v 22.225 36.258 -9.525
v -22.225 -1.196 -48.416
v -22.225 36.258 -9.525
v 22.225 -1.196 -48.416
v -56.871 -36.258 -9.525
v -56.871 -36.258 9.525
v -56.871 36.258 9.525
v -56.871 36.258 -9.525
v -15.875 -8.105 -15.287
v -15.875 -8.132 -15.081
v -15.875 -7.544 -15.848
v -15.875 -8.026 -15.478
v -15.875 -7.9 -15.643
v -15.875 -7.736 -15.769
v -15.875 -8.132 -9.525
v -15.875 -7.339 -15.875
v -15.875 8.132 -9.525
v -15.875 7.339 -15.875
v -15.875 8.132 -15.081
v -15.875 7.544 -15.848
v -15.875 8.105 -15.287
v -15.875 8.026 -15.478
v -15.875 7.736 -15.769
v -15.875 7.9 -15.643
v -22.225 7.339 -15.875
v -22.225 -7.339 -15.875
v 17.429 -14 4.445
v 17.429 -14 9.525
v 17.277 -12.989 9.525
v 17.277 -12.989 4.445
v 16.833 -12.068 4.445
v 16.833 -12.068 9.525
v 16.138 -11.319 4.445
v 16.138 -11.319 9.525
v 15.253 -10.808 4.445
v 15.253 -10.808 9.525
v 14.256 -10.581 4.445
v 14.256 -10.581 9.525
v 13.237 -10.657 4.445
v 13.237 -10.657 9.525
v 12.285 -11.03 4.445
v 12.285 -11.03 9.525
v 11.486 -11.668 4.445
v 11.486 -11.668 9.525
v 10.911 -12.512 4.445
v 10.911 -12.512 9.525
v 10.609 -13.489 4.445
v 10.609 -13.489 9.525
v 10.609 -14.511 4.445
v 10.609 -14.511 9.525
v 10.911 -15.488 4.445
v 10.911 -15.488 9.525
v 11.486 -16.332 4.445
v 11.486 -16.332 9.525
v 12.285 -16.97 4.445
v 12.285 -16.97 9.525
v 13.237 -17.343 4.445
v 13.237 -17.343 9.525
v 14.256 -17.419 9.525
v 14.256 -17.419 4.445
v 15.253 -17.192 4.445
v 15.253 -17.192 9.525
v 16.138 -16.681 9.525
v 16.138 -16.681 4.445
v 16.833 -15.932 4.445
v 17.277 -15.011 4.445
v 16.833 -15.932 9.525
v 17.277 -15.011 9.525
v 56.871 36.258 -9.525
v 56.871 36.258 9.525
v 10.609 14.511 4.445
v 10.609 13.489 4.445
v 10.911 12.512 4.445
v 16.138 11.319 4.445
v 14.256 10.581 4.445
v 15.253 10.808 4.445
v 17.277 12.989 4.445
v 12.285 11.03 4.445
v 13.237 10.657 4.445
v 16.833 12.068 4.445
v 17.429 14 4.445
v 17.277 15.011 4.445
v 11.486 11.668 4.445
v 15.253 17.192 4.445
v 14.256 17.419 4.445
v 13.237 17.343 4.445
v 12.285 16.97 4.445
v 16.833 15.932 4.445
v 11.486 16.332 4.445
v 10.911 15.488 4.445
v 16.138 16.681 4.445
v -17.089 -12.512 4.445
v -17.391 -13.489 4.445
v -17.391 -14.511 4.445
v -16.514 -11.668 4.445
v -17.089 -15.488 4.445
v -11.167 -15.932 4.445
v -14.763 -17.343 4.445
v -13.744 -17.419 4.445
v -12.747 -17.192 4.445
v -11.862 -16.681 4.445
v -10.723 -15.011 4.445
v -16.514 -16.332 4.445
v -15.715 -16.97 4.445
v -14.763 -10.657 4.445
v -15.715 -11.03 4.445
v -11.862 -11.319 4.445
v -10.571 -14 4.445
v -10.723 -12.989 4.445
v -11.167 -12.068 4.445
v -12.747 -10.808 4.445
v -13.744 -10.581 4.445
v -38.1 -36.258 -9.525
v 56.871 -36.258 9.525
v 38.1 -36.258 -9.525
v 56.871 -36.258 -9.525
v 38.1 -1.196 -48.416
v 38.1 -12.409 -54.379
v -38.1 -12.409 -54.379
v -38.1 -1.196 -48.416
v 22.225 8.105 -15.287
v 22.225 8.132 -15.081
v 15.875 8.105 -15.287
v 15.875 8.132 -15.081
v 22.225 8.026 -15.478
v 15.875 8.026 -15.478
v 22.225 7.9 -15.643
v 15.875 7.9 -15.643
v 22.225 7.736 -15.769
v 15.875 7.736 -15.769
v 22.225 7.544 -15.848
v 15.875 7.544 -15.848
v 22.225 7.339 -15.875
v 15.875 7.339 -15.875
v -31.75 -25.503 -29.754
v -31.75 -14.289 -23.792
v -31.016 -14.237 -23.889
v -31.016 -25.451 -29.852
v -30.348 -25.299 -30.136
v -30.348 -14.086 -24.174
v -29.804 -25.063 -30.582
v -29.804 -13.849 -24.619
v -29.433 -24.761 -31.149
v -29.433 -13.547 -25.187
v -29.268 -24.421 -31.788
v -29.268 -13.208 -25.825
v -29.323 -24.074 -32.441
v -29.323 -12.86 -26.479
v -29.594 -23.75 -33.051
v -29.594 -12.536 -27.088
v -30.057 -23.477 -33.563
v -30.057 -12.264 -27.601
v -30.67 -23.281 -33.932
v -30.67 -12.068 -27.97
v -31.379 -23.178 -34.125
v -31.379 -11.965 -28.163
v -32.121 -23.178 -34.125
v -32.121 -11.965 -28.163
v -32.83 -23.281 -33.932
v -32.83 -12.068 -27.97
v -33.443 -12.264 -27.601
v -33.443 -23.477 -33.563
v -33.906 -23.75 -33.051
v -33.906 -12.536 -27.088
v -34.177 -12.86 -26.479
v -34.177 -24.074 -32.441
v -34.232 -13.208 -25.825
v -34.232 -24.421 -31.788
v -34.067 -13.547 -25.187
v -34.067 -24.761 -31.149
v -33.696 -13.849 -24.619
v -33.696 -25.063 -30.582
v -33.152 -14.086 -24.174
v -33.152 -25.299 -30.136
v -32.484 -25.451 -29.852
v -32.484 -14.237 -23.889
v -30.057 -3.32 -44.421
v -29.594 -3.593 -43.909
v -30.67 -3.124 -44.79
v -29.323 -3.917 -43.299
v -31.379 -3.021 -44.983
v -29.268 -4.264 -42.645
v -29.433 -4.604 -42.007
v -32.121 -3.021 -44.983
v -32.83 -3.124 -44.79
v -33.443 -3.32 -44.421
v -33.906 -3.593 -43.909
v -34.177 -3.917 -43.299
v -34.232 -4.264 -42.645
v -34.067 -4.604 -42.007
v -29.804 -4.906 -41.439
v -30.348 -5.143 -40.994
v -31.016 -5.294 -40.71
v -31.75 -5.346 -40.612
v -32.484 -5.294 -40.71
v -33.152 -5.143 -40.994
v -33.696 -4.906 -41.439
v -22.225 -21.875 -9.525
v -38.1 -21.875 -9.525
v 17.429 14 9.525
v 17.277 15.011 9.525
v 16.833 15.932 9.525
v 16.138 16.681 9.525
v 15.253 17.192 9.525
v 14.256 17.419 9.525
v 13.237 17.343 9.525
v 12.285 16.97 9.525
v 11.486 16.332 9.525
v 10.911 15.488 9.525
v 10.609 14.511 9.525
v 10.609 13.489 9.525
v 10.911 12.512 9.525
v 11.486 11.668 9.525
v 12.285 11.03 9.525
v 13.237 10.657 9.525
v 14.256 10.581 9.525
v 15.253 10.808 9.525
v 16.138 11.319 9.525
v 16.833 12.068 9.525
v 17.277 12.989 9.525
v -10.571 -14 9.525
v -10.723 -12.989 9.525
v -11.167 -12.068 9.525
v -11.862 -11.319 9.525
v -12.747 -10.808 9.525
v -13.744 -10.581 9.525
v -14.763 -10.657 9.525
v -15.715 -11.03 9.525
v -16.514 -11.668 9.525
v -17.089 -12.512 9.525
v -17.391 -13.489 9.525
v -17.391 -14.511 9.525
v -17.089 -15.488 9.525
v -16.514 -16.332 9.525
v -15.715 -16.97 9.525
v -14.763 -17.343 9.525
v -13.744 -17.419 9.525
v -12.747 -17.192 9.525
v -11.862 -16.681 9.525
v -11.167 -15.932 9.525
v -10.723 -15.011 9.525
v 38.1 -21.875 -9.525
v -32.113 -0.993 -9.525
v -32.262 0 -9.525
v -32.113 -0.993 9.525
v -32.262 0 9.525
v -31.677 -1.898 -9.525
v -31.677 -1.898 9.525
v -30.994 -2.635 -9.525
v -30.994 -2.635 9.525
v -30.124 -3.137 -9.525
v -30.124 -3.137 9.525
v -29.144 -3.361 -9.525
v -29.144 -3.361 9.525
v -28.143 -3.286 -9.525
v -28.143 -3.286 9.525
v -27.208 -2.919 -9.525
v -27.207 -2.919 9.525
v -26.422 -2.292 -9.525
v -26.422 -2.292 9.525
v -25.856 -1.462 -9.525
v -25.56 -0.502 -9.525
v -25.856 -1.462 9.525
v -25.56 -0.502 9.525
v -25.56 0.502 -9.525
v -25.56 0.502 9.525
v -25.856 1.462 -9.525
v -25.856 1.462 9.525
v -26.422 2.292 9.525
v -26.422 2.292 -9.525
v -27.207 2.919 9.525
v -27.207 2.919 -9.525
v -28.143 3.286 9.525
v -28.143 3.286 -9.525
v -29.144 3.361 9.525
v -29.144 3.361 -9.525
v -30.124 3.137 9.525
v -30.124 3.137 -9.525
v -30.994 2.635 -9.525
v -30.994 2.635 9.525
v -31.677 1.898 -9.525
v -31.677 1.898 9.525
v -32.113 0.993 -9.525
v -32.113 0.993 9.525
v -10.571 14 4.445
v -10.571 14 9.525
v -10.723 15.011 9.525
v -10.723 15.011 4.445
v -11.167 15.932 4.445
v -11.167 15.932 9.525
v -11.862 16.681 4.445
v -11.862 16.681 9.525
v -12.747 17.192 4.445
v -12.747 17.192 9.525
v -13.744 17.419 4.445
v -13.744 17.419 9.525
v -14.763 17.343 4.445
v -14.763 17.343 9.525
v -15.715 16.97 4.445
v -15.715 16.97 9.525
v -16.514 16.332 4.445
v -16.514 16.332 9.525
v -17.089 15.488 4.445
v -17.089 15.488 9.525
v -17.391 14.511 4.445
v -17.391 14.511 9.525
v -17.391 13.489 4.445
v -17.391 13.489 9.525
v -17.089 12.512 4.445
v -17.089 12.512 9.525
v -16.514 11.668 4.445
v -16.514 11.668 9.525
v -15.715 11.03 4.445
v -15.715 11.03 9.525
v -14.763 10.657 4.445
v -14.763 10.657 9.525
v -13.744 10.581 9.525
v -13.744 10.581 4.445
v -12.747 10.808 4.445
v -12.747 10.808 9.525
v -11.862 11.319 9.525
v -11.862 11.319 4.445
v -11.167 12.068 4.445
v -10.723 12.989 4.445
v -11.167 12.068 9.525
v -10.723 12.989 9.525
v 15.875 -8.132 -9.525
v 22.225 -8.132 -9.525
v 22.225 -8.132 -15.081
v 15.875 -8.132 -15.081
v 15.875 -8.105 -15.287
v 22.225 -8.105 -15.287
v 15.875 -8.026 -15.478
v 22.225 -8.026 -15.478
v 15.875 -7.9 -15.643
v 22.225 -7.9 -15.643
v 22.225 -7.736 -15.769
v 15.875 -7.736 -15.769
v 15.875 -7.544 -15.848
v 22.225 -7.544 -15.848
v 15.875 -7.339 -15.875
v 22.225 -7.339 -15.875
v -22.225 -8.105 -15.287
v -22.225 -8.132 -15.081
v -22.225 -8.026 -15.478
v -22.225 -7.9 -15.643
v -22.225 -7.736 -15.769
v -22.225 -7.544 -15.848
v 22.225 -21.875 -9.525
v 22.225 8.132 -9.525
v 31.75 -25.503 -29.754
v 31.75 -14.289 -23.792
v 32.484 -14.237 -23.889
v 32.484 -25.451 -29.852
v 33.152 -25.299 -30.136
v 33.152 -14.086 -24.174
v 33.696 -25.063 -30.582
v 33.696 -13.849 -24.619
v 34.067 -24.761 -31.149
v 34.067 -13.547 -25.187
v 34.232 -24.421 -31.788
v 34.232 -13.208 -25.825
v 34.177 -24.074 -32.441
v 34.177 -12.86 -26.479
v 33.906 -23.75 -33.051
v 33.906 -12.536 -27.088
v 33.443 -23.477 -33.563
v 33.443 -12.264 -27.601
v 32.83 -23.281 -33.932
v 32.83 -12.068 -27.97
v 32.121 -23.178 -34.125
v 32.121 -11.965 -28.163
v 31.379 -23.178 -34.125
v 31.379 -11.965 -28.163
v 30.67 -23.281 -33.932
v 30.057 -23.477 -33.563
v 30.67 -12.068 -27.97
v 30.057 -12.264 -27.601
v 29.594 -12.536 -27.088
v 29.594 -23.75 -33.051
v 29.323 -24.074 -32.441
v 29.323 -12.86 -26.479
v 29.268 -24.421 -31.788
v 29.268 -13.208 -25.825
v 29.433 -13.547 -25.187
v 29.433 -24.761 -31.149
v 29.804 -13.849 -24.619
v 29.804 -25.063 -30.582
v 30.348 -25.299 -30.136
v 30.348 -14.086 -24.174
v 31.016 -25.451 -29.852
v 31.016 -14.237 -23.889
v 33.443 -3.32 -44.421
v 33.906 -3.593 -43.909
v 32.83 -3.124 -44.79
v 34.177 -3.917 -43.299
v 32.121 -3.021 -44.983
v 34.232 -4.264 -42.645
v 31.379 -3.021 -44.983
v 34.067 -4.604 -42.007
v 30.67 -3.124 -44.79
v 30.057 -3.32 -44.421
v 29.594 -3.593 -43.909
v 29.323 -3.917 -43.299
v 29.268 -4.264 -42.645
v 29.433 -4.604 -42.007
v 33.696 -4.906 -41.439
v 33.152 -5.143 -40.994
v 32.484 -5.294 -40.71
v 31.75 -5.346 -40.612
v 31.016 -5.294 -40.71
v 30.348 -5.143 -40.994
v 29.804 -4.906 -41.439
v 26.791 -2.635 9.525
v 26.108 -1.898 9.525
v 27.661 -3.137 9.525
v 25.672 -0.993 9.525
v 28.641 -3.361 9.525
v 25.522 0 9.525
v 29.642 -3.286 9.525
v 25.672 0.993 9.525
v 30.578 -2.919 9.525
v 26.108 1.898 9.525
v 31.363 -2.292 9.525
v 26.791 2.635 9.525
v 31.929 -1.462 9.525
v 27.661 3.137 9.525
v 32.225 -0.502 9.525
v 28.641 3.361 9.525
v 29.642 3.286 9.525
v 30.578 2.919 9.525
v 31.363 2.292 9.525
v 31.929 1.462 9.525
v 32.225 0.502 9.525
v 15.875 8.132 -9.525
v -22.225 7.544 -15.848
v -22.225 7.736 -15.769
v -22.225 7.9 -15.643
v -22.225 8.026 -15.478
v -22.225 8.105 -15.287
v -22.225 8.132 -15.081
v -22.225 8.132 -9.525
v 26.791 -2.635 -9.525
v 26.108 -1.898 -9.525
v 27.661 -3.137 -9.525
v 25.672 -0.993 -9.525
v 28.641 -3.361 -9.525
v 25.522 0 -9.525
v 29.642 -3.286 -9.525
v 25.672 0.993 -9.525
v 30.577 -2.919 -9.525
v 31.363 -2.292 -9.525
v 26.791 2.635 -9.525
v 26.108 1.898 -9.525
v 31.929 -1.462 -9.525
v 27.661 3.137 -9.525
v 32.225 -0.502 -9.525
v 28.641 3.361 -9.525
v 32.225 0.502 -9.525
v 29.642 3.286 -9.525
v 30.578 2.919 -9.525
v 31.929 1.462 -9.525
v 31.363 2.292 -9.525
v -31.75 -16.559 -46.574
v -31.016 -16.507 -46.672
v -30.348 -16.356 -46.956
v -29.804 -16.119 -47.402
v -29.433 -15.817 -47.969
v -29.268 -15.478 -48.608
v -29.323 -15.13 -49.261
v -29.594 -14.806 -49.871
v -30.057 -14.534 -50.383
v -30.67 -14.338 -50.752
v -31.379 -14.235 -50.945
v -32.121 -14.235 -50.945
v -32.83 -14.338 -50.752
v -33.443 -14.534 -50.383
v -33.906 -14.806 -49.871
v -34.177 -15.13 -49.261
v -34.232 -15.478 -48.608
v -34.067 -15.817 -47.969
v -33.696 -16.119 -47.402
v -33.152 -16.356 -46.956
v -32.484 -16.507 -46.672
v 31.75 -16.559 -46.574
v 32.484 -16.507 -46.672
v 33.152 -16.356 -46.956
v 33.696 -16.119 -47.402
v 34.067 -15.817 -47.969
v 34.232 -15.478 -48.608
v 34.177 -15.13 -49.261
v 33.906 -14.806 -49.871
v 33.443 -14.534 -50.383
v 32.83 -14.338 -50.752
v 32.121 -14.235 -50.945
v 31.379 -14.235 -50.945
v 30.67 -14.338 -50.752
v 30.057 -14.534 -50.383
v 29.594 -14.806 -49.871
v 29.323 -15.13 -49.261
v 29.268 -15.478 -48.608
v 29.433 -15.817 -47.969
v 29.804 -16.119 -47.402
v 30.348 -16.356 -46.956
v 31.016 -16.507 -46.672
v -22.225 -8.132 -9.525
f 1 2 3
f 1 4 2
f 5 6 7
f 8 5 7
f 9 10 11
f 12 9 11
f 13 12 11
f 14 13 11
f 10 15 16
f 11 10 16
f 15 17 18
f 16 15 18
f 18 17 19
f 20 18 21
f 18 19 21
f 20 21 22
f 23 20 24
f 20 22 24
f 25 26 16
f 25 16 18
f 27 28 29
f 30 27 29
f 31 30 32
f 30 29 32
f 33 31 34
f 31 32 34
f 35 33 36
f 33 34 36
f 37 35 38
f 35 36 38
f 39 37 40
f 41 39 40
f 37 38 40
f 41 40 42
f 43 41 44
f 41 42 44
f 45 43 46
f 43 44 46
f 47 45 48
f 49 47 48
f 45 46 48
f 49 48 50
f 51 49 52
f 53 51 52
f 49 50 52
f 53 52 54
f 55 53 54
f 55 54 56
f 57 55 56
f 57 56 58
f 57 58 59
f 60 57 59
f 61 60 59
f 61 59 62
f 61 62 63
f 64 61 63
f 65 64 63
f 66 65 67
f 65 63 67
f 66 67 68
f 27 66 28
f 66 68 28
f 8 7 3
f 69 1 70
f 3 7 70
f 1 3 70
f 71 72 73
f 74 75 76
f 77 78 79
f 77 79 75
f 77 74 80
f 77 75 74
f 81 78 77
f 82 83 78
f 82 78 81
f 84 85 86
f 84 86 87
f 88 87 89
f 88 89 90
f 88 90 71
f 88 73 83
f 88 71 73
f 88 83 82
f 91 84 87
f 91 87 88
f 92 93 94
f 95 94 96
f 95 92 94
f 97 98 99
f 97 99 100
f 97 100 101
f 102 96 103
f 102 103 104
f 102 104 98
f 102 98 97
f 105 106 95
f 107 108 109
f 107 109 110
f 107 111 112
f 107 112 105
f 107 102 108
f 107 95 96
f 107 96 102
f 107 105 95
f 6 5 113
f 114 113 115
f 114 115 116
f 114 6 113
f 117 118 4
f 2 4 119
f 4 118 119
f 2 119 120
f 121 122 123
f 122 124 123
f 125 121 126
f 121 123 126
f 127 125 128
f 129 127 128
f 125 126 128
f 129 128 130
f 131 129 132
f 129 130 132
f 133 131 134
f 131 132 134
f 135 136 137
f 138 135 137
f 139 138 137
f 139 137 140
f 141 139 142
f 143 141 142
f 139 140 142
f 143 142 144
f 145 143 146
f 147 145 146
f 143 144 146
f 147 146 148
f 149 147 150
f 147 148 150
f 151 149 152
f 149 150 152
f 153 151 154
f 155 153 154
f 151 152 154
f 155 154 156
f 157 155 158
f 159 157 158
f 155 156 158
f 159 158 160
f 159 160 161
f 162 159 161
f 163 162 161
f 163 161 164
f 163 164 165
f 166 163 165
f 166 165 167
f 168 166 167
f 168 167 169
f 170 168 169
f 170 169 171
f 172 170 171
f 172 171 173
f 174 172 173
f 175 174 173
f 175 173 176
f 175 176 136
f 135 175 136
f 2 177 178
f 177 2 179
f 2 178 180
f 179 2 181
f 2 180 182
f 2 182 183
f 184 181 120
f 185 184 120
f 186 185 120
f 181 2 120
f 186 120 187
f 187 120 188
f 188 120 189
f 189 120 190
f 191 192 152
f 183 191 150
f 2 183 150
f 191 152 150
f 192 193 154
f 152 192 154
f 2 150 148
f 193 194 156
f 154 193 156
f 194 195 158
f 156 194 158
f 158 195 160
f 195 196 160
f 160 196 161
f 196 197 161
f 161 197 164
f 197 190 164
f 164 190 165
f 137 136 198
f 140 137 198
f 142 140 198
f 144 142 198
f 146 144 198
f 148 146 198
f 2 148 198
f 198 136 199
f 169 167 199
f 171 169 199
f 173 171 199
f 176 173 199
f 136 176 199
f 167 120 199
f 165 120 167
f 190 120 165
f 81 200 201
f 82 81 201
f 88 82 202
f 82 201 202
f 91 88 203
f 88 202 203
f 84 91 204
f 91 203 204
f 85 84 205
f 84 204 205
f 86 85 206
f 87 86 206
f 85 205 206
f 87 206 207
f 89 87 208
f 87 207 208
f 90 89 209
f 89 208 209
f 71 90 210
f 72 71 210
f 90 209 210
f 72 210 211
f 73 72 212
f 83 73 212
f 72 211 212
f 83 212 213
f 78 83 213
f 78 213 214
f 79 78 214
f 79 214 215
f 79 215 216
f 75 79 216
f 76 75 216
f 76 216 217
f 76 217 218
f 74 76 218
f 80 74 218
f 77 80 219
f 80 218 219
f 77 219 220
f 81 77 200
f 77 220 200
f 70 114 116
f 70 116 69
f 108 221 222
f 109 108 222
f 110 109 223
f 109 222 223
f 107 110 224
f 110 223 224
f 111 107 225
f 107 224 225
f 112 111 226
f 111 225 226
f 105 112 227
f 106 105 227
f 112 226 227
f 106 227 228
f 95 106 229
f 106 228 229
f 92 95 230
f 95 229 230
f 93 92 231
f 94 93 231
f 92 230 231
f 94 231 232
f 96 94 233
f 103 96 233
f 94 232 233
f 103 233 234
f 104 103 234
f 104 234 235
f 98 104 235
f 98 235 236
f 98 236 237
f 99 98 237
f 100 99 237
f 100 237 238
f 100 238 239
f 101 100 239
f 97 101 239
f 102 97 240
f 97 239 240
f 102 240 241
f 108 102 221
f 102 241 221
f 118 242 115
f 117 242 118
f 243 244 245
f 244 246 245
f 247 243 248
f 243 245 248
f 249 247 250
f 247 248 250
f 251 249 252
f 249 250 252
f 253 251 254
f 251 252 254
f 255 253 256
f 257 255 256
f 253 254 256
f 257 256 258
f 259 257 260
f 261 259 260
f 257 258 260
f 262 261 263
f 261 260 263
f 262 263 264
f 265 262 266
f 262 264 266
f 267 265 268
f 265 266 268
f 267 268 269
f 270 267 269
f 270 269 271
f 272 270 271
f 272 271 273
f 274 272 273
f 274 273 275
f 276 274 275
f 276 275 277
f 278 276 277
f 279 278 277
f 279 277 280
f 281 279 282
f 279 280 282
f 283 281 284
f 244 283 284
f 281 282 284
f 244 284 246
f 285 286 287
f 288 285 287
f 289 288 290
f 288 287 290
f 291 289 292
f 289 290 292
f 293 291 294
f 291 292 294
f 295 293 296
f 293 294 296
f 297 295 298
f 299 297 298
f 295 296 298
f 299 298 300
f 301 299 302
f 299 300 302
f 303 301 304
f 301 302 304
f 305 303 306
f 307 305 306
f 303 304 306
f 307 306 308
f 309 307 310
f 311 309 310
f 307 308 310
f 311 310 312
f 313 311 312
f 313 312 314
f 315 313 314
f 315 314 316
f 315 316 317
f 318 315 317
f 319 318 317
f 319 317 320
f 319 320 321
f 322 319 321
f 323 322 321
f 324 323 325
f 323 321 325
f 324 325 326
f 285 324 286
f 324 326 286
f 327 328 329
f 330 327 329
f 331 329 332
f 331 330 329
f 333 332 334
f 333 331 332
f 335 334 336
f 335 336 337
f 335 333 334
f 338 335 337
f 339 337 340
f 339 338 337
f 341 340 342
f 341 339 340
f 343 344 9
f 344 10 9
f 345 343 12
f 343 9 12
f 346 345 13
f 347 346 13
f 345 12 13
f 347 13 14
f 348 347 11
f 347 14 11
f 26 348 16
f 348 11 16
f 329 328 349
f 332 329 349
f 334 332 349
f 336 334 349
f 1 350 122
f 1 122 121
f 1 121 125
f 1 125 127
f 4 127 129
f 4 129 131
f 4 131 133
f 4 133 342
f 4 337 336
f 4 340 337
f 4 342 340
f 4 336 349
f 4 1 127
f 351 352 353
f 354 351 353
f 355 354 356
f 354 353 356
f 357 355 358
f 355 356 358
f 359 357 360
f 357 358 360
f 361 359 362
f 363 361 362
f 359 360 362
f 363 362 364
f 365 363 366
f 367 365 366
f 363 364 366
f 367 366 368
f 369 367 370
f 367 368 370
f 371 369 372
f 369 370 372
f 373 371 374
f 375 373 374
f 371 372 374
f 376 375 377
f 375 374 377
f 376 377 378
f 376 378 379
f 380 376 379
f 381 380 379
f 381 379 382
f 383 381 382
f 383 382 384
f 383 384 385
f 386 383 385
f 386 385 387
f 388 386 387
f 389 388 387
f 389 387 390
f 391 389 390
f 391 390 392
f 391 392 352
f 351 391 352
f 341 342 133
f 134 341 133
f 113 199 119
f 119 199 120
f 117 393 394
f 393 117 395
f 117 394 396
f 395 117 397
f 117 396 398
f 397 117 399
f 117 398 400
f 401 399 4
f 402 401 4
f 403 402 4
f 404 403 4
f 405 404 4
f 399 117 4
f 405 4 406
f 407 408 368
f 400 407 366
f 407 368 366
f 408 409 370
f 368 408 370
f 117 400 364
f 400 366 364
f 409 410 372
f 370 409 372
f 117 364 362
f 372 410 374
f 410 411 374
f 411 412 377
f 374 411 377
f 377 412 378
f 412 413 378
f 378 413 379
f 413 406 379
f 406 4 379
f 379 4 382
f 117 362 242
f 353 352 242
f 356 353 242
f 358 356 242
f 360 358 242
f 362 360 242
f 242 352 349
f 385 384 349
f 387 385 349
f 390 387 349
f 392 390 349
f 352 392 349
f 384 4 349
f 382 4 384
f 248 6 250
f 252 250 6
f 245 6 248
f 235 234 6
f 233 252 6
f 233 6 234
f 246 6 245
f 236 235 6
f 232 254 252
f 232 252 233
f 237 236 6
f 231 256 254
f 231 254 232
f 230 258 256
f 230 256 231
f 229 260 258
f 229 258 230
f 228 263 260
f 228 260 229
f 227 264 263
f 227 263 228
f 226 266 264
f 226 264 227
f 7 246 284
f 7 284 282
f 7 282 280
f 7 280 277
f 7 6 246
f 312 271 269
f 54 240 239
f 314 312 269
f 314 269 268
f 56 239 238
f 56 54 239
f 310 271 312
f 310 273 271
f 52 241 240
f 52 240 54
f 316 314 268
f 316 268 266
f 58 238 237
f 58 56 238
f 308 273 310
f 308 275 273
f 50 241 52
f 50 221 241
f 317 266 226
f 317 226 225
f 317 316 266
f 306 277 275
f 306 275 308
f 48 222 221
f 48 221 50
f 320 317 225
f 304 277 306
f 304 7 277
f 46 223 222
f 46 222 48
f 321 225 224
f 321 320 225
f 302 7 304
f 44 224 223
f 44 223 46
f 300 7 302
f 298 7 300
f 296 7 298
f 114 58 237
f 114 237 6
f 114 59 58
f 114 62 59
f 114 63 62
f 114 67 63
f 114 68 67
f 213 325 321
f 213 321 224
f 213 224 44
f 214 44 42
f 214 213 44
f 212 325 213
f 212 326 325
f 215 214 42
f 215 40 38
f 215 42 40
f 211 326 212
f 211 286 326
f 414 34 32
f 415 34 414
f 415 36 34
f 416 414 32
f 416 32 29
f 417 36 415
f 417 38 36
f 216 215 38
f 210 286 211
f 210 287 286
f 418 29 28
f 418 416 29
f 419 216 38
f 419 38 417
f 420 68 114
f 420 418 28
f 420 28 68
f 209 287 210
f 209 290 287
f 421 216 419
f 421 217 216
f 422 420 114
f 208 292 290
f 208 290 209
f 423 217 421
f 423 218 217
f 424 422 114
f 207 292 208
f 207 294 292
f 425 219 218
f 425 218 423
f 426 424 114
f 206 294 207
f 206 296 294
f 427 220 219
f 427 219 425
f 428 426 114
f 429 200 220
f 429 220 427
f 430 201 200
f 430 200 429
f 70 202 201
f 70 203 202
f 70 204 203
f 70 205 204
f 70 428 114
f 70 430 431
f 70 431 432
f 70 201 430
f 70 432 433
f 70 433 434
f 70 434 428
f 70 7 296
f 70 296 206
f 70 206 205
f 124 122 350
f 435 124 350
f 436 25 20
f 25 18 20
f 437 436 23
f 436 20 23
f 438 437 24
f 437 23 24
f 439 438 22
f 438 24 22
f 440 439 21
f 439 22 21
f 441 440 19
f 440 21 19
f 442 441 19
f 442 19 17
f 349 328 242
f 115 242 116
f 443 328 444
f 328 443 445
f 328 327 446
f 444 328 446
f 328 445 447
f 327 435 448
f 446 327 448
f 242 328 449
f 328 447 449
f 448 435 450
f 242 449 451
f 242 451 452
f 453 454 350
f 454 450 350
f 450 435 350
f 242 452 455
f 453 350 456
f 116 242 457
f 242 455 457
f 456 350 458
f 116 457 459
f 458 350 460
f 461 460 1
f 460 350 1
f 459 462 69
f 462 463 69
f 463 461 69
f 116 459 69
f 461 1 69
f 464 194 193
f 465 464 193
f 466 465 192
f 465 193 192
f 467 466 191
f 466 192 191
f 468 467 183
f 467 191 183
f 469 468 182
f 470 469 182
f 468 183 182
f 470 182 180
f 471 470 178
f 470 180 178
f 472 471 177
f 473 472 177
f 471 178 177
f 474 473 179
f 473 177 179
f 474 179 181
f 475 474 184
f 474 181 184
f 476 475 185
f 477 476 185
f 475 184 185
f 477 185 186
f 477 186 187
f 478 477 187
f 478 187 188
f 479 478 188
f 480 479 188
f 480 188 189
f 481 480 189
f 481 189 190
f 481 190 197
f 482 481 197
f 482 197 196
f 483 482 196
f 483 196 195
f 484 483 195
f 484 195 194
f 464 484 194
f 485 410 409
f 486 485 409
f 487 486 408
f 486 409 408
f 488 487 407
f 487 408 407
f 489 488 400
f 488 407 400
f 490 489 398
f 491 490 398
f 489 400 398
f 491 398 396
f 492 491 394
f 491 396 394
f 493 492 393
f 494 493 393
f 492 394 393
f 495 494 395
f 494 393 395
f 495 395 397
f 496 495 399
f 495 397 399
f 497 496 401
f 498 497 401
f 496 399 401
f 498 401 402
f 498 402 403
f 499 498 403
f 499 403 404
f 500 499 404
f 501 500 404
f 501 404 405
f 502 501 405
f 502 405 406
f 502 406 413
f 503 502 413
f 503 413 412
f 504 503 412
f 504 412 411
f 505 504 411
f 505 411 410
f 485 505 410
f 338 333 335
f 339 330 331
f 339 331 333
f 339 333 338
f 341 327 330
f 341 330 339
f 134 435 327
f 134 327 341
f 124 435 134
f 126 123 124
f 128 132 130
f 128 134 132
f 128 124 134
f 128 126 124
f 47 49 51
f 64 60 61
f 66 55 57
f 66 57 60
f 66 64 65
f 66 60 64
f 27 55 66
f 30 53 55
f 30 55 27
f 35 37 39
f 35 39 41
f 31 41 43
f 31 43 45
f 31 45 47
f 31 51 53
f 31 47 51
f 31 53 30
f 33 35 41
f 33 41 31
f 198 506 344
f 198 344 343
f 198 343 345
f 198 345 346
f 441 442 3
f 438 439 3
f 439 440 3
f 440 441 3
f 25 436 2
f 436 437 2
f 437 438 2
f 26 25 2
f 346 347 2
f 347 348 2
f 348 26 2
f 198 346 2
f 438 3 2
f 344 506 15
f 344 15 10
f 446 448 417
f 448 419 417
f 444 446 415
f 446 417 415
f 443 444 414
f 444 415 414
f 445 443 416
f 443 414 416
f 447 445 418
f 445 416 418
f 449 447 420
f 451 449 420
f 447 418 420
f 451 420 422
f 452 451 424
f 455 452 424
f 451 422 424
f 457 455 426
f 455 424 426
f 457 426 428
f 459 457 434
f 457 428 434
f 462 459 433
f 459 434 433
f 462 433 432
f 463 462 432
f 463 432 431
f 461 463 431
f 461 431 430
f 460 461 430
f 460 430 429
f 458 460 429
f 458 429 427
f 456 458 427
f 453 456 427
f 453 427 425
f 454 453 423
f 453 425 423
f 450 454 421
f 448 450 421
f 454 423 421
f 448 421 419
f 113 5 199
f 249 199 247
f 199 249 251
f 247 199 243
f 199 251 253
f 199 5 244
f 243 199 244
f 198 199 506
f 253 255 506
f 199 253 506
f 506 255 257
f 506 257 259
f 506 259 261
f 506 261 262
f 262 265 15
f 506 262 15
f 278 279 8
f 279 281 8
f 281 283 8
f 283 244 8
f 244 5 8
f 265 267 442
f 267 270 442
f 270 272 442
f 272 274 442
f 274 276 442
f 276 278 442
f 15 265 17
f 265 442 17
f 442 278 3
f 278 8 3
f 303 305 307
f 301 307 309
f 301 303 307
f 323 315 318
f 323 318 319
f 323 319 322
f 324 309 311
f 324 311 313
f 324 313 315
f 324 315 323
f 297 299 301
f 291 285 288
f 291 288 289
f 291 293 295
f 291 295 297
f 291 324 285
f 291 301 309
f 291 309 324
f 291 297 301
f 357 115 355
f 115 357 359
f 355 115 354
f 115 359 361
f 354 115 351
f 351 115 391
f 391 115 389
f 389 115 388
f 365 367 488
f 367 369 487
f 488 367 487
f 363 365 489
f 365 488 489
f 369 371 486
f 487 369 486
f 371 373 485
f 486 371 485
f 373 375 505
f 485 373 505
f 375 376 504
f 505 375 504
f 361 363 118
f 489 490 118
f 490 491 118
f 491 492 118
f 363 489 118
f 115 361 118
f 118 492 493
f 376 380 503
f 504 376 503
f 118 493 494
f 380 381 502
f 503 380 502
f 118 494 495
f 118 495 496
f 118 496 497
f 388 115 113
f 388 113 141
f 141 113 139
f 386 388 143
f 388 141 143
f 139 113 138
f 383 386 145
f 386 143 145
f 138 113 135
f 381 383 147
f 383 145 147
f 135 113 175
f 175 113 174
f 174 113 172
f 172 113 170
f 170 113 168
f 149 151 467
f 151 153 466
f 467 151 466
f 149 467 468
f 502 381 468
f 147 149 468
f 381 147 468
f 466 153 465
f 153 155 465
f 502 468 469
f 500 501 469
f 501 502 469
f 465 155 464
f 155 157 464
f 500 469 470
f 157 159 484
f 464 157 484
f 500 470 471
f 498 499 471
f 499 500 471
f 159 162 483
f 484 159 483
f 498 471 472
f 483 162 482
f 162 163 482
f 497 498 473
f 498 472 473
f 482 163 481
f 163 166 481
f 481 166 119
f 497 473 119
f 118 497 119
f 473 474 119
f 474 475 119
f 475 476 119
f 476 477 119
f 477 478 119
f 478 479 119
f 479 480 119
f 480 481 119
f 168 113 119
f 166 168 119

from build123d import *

# Parameters (mm, degrees)
SKETCH1_W                      = 113.7412
SKETCH1_H                      = 72.517
BOSS_EXTRUDE1_DEPTH            = 9.525
BOSS_EXTRUDE5_START            = -38.1
BOSS_EXTRUDE5_DEPTH            = 76.2
CUT_EXTRUDE3_REACH             = 88.637
SKETCH1_6_R                    = 3.37
CUT_EXTRUDE3_DIRECTION_2_DEPTH = 87.637123003
BOSS_EXTRUDE6_DEPTH            = 22.225
SKETCH7_R                      = 2.4892
CUT_EXTRUDE4_DEPTH             = 92.543856508
SKETCH8_R                      = 3.429
CUT_EXTRUDE5_DEPTH             = 5.08
CUT_EXTRUDE7_DEPTH             = 6.35
FILLET2_R                      = 0.79375


# Read off the part's stored shape, not the designer's step: Boss-Extrude5
with BuildPart() as part:
    # Sketch1 → Boss-Extrude1 (new, symmetric)
    with BuildSketch(Plane.XY):
        Rectangle(SKETCH1_W, SKETCH1_H)
    extrude(amount=BOSS_EXTRUDE1_DEPTH, both=True)

    # Boss-Extrude5 outline → Boss-Extrude5 (add)
    with BuildSketch(Plane(origin=(0, 0, 0), x_dir=(0, 0, -1), z_dir=(1, 0, 0)).offset(BOSS_EXTRUDE5_START)):
        Polygon((54.378737717, -12.40934461), (48.41644887, -1.195910181), (9.525, -21.874860356), (9.525, -36.2585), align=None)
    extrude(amount=BOSS_EXTRUDE5_DEPTH)

    # Sketch1<6> → Cut-Extrude3 (cut, up to next)
    with BuildSketch(Plane.XY, mode=Mode.PRIVATE) as cut_extrude3_sk1:
        with Locations(Location((-28.8925, 0, 0), (0, 0, 180))):
            Circle(SKETCH1_6_R)
    cut_extrude3_tool1 = extrude(cut_extrude3_sk1.sketch, amount=-CUT_EXTRUDE3_REACH, mode=Mode.PRIVATE) & part.part
    # Sketch1<6> → Cut-Extrude3 (cut, up to next)
    with BuildSketch(Plane.XY, mode=Mode.PRIVATE) as cut_extrude3_sk2:
        with Locations(Location((28.8925, 0, 0), (0, 0, 180))):
            Circle(SKETCH1_6_R)
    cut_extrude3_tool2 = extrude(cut_extrude3_sk2.sketch, amount=-CUT_EXTRUDE3_REACH, mode=Mode.PRIVATE) & part.part
    add(cut_extrude3_tool1.solids().sort_by_distance((-28.8925, 0, 0))[0], mode=Mode.SUBTRACT)
    add(cut_extrude3_tool2.solids().sort_by_distance((28.8925, 0, 0))[0], mode=Mode.SUBTRACT)

    # Sketch1<6> → Cut-Extrude3 direction 2 (cut)
    with BuildSketch(Plane.XY):
        with Locations(Location((-28.8925, 0, 0), (0, 0, 180))):
            Circle(SKETCH1_6_R)
        with Locations(Location((28.8925, 0, 0), (0, 0, 180))):
            Circle(SKETCH1_6_R)
    extrude(amount=CUT_EXTRUDE3_DIRECTION_2_DEPTH, mode=Mode.SUBTRACT)

    # Sketch6 → Boss-Extrude6 (add, symmetric)
    with BuildSketch(Plane(origin=(0, 0, 0), x_dir=(0, 0, -1), z_dir=(1, 0, 0))):
        Polygon((9.525, 36.2585), (9.525, -21.874860356), (48.41644887, -1.195910181), align=None)
    extrude(amount=BOSS_EXTRUDE6_DEPTH, both=True)

    # Sketch7 → Cut-Extrude4 (cut, through all)
    with BuildSketch(Plane(origin=(0, -21.001854955, -11.166884362), x_dir=(1, 0, 0), z_dir=(0, 0.882947592858928, 0.46947156278588875))):
        with Locations(Location((31.75, 35.837741163, 0), (0, 0, 270))):
            Circle(SKETCH7_R)
        with Locations(Location((31.75, 16.787741163, 0), (0, 0, 270))):
            Circle(SKETCH7_R)
        with Locations(Location((-31.75, 35.837741163, 0), (0, 0, 270))):
            Circle(SKETCH7_R)
        with Locations(Location((-31.75, 16.787741163, 0), (0, 0, 270))):
            Circle(SKETCH7_R)
    extrude(amount=-CUT_EXTRUDE4_DEPTH, mode=Mode.SUBTRACT)

    # Sketch8 → Cut-Extrude5 (cut)
    with BuildSketch(Plane.XY.offset(9.525)):
        with Locations((-14, 14)):
            Circle(SKETCH8_R)
        with Locations((14, 14)):
            Circle(SKETCH8_R)
        with Locations((-14, -14)):
            Circle(SKETCH8_R)
        with Locations((14, -14)):
            Circle(SKETCH8_R)
    extrude(amount=-CUT_EXTRUDE5_DEPTH, mode=Mode.SUBTRACT)

    # Sketch11 → Cut-Extrude7 (cut)
    with BuildSketch(Plane(origin=(22.225, 0, 0), x_dir=(0, 0, -1), z_dir=(1, 0, 0))):
        Polygon((9.525, 3.37), (9.525, -3.37), (9.525, -8.1325), (15.875, -8.1325), (15.875, 8.1325), (9.525, 8.1325), align=None)
    cut_extrude7 = extrude(amount=-CUT_EXTRUDE7_DEPTH, mode=Mode.SUBTRACT)

    # Mirror1: Cut-Extrude7 across plane
    add(cut_extrude7.mirror(Plane(origin=(0, 0, 0), x_dir=(0, 0, 1), z_dir=(1, 0, 0))), mode=Mode.SUBTRACT)

    # Fillet2
    fillet2_edges = [part.edges().sort_by_distance(p)[0] for p in [
        (19.05, 8.1325, -15.875),
        (19.05, -8.1325, -15.875),
        (-19.05, -8.1325, -15.875),
        (-19.05, 8.1325, -15.875),
    ]]
    fillet(fillet2_edges, radius=FILLET2_R)


solid = part.part
